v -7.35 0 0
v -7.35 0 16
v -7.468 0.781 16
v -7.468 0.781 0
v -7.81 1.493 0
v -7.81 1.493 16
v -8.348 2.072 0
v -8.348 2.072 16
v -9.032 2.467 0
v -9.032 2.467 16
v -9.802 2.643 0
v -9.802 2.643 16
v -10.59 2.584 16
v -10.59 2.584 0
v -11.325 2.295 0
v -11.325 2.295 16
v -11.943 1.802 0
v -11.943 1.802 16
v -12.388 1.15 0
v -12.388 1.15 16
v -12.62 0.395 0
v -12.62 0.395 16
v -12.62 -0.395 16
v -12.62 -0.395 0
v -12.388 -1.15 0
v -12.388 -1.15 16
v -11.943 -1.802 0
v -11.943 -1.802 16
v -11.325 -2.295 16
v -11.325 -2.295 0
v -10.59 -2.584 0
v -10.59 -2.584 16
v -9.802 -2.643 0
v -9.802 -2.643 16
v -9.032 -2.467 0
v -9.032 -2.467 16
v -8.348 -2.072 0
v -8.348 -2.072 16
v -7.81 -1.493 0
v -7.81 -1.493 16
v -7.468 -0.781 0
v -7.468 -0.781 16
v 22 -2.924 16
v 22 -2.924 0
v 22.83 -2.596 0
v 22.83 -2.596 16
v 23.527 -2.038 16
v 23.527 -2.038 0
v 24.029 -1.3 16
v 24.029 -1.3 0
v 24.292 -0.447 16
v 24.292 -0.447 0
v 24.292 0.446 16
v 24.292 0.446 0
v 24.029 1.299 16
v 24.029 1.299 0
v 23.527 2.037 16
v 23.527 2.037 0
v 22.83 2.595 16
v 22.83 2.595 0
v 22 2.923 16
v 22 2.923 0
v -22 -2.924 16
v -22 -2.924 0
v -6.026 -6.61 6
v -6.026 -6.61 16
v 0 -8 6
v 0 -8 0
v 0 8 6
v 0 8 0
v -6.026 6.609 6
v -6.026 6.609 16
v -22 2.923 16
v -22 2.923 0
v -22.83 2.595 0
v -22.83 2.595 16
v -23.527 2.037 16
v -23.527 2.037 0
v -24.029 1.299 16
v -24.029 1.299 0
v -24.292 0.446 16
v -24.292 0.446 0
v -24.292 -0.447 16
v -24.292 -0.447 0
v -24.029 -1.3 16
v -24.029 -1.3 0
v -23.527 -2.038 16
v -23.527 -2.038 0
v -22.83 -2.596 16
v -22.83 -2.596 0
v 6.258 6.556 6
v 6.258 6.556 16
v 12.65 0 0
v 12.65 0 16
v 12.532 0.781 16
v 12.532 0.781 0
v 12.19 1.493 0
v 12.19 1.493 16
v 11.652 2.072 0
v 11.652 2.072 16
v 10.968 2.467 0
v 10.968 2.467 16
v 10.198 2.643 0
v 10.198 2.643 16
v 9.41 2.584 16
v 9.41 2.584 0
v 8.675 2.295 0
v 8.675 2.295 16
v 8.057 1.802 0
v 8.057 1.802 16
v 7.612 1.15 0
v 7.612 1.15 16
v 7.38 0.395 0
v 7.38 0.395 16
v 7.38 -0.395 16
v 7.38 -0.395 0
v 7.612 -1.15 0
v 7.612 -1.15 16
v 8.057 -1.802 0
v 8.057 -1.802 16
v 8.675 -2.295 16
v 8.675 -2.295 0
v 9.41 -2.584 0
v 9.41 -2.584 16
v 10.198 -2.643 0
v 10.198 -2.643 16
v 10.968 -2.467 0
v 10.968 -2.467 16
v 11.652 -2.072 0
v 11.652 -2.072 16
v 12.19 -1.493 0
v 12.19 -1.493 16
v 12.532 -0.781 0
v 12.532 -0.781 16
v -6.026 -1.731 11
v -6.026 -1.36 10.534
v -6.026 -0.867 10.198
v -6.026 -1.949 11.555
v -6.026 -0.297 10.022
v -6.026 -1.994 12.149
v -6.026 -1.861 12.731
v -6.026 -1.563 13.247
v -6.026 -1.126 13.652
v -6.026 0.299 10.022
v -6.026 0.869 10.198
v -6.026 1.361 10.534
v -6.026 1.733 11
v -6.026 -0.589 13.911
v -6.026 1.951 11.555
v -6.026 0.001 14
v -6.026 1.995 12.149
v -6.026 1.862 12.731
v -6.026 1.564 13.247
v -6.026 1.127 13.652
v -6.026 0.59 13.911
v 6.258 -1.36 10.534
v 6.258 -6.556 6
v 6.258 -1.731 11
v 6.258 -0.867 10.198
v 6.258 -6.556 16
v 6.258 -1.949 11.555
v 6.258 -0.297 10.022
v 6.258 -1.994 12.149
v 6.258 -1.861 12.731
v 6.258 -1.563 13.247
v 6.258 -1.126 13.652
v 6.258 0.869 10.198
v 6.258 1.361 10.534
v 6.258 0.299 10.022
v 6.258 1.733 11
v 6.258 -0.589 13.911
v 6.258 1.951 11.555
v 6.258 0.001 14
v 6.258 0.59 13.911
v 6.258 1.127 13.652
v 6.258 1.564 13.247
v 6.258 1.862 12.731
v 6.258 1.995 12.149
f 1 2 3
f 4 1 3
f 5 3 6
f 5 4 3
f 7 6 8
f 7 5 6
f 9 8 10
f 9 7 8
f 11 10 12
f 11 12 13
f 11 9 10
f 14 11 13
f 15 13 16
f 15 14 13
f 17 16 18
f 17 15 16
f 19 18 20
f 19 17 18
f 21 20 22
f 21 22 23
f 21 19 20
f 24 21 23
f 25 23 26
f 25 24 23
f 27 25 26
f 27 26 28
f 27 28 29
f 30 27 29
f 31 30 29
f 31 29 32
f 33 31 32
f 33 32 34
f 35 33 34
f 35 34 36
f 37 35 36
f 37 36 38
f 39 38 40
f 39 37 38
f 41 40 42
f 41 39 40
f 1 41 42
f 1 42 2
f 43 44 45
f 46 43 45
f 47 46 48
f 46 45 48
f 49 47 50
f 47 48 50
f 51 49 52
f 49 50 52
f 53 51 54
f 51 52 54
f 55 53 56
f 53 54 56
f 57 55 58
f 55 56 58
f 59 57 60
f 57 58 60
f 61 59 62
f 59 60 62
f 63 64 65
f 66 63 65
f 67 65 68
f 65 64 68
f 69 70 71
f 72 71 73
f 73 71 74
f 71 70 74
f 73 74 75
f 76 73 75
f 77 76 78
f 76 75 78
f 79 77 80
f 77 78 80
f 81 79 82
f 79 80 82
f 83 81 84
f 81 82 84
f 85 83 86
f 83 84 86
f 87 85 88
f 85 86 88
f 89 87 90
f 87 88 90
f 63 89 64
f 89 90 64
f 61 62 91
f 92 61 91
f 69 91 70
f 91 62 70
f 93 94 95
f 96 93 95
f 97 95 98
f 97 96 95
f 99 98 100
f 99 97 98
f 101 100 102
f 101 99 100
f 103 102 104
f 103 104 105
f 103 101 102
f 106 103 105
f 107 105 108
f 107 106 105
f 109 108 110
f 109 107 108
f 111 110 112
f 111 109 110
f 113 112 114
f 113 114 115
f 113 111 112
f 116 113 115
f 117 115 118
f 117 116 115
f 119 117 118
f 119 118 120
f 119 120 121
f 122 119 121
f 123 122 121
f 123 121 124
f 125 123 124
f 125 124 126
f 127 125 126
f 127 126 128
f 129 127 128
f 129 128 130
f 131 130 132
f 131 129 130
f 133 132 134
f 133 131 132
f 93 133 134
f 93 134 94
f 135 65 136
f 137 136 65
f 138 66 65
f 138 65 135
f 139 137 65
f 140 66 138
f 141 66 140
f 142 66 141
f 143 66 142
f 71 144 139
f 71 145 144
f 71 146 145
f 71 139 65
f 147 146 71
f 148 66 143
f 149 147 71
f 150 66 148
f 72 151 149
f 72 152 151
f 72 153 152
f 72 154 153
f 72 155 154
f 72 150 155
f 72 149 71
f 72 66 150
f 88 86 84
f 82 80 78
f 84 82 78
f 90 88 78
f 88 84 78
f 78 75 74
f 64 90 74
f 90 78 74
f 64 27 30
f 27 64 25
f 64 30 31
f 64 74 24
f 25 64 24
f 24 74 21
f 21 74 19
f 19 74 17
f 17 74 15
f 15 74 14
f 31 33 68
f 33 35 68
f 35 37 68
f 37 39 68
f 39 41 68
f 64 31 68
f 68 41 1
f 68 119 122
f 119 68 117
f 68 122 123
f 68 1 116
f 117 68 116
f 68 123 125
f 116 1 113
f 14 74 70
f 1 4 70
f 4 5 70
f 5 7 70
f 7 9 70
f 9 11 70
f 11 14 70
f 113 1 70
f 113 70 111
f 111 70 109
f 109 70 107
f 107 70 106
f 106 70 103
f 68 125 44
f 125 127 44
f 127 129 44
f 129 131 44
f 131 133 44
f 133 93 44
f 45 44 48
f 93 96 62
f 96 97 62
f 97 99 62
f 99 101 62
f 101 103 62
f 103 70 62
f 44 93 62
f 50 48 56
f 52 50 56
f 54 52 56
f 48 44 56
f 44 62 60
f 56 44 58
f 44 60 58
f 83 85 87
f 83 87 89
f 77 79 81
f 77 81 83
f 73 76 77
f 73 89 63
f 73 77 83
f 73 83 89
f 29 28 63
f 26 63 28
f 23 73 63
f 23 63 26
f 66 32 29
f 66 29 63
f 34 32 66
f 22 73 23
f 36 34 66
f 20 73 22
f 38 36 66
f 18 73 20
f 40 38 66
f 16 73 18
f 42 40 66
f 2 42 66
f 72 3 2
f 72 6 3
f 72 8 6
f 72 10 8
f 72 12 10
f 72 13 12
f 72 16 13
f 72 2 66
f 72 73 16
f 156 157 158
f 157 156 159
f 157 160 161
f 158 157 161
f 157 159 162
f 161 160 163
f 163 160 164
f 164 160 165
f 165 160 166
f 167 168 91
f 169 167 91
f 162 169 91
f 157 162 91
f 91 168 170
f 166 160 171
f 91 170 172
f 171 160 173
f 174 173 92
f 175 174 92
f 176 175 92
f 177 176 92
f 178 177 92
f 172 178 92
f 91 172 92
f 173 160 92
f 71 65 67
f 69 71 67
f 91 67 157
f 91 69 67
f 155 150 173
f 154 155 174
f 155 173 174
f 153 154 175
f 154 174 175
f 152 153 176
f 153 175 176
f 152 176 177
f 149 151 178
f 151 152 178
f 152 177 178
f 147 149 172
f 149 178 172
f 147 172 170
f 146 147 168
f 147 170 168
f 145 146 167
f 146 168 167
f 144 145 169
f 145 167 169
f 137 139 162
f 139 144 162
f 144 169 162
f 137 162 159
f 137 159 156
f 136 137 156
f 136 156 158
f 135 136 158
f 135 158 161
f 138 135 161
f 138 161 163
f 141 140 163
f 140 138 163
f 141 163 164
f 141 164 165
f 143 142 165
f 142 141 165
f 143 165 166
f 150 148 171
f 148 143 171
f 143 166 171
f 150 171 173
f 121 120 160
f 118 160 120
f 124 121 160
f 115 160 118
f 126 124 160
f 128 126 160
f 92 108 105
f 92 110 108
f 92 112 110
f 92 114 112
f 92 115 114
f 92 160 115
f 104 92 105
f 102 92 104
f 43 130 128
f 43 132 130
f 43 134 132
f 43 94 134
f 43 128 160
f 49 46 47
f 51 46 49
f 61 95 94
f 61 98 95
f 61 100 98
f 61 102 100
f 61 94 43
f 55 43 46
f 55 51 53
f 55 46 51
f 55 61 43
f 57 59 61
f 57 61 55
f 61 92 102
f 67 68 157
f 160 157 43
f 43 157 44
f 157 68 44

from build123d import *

# Parameters (mm, degrees)
SKETCH1_R           = 2.65
BOSS_EXTRUDE1_DEPTH = 16
SKETCH3_W           = 12.283798513
SKETCH3_H           = 21.086734885
CUT_EXTRUDE2_DEPTH  = 10
BOSS_EXTRUDE2_REACH = 32.583
SKETCH4_R           = 2


with BuildPart() as part:
    # Sketch1 → Boss-Extrude1 (new body)
    with BuildSketch(Plane.XY):
        with BuildLine():
            Line((0, 8), (-22, 2.922544759))
            ThreePointArc((-22, 2.922544759), (-24.325354345, -0.000692743), (-21.999845251, -2.923807139))
            Line((-21.999845251, -2.923807139), (0, -8))
            Line((0, -8), (21.999845251, -2.923807139))
            ThreePointArc((21.999845251, -2.923807139), (24.325354345, -0.000692743), (22, 2.922544759))
            Line((22, 2.922544759), (0, 8))
        make_face()
        with Locations((10, 0)):
            Circle(SKETCH1_R, mode=Mode.SUBTRACT)
        with Locations((-10, 0)):
            Circle(SKETCH1_R, mode=Mode.SUBTRACT)
    extrude(amount=BOSS_EXTRUDE1_DEPTH)

    # Sketch3 → Cut-Extrude2 (cut)
    with BuildSketch(Plane.XY.offset(16)):
        with Locations((0.115880044, 2.543367443)):
            Rectangle(SKETCH3_W, SKETCH3_H)
    extrude(amount=-CUT_EXTRUDE2_DEPTH, mode=Mode.SUBTRACT)

    # Sketch4 → Boss-Extrude2 (add, up to next)
    with BuildSketch(Plane.ZY.offset(-6.257779301), mode=Mode.PRIVATE) as boss_extrude2_sk1:
        with Locations((12, 0.000745713)):
            Circle(SKETCH4_R)
    boss_extrude2_tool1 = extrude(boss_extrude2_sk1.sketch, amount=BOSS_EXTRUDE2_REACH, mode=Mode.PRIVATE) - part.part
    add(boss_extrude2_tool1.solids().sort_by_distance((6.257779, 0.000746, 12))[0])


solid = part.part
